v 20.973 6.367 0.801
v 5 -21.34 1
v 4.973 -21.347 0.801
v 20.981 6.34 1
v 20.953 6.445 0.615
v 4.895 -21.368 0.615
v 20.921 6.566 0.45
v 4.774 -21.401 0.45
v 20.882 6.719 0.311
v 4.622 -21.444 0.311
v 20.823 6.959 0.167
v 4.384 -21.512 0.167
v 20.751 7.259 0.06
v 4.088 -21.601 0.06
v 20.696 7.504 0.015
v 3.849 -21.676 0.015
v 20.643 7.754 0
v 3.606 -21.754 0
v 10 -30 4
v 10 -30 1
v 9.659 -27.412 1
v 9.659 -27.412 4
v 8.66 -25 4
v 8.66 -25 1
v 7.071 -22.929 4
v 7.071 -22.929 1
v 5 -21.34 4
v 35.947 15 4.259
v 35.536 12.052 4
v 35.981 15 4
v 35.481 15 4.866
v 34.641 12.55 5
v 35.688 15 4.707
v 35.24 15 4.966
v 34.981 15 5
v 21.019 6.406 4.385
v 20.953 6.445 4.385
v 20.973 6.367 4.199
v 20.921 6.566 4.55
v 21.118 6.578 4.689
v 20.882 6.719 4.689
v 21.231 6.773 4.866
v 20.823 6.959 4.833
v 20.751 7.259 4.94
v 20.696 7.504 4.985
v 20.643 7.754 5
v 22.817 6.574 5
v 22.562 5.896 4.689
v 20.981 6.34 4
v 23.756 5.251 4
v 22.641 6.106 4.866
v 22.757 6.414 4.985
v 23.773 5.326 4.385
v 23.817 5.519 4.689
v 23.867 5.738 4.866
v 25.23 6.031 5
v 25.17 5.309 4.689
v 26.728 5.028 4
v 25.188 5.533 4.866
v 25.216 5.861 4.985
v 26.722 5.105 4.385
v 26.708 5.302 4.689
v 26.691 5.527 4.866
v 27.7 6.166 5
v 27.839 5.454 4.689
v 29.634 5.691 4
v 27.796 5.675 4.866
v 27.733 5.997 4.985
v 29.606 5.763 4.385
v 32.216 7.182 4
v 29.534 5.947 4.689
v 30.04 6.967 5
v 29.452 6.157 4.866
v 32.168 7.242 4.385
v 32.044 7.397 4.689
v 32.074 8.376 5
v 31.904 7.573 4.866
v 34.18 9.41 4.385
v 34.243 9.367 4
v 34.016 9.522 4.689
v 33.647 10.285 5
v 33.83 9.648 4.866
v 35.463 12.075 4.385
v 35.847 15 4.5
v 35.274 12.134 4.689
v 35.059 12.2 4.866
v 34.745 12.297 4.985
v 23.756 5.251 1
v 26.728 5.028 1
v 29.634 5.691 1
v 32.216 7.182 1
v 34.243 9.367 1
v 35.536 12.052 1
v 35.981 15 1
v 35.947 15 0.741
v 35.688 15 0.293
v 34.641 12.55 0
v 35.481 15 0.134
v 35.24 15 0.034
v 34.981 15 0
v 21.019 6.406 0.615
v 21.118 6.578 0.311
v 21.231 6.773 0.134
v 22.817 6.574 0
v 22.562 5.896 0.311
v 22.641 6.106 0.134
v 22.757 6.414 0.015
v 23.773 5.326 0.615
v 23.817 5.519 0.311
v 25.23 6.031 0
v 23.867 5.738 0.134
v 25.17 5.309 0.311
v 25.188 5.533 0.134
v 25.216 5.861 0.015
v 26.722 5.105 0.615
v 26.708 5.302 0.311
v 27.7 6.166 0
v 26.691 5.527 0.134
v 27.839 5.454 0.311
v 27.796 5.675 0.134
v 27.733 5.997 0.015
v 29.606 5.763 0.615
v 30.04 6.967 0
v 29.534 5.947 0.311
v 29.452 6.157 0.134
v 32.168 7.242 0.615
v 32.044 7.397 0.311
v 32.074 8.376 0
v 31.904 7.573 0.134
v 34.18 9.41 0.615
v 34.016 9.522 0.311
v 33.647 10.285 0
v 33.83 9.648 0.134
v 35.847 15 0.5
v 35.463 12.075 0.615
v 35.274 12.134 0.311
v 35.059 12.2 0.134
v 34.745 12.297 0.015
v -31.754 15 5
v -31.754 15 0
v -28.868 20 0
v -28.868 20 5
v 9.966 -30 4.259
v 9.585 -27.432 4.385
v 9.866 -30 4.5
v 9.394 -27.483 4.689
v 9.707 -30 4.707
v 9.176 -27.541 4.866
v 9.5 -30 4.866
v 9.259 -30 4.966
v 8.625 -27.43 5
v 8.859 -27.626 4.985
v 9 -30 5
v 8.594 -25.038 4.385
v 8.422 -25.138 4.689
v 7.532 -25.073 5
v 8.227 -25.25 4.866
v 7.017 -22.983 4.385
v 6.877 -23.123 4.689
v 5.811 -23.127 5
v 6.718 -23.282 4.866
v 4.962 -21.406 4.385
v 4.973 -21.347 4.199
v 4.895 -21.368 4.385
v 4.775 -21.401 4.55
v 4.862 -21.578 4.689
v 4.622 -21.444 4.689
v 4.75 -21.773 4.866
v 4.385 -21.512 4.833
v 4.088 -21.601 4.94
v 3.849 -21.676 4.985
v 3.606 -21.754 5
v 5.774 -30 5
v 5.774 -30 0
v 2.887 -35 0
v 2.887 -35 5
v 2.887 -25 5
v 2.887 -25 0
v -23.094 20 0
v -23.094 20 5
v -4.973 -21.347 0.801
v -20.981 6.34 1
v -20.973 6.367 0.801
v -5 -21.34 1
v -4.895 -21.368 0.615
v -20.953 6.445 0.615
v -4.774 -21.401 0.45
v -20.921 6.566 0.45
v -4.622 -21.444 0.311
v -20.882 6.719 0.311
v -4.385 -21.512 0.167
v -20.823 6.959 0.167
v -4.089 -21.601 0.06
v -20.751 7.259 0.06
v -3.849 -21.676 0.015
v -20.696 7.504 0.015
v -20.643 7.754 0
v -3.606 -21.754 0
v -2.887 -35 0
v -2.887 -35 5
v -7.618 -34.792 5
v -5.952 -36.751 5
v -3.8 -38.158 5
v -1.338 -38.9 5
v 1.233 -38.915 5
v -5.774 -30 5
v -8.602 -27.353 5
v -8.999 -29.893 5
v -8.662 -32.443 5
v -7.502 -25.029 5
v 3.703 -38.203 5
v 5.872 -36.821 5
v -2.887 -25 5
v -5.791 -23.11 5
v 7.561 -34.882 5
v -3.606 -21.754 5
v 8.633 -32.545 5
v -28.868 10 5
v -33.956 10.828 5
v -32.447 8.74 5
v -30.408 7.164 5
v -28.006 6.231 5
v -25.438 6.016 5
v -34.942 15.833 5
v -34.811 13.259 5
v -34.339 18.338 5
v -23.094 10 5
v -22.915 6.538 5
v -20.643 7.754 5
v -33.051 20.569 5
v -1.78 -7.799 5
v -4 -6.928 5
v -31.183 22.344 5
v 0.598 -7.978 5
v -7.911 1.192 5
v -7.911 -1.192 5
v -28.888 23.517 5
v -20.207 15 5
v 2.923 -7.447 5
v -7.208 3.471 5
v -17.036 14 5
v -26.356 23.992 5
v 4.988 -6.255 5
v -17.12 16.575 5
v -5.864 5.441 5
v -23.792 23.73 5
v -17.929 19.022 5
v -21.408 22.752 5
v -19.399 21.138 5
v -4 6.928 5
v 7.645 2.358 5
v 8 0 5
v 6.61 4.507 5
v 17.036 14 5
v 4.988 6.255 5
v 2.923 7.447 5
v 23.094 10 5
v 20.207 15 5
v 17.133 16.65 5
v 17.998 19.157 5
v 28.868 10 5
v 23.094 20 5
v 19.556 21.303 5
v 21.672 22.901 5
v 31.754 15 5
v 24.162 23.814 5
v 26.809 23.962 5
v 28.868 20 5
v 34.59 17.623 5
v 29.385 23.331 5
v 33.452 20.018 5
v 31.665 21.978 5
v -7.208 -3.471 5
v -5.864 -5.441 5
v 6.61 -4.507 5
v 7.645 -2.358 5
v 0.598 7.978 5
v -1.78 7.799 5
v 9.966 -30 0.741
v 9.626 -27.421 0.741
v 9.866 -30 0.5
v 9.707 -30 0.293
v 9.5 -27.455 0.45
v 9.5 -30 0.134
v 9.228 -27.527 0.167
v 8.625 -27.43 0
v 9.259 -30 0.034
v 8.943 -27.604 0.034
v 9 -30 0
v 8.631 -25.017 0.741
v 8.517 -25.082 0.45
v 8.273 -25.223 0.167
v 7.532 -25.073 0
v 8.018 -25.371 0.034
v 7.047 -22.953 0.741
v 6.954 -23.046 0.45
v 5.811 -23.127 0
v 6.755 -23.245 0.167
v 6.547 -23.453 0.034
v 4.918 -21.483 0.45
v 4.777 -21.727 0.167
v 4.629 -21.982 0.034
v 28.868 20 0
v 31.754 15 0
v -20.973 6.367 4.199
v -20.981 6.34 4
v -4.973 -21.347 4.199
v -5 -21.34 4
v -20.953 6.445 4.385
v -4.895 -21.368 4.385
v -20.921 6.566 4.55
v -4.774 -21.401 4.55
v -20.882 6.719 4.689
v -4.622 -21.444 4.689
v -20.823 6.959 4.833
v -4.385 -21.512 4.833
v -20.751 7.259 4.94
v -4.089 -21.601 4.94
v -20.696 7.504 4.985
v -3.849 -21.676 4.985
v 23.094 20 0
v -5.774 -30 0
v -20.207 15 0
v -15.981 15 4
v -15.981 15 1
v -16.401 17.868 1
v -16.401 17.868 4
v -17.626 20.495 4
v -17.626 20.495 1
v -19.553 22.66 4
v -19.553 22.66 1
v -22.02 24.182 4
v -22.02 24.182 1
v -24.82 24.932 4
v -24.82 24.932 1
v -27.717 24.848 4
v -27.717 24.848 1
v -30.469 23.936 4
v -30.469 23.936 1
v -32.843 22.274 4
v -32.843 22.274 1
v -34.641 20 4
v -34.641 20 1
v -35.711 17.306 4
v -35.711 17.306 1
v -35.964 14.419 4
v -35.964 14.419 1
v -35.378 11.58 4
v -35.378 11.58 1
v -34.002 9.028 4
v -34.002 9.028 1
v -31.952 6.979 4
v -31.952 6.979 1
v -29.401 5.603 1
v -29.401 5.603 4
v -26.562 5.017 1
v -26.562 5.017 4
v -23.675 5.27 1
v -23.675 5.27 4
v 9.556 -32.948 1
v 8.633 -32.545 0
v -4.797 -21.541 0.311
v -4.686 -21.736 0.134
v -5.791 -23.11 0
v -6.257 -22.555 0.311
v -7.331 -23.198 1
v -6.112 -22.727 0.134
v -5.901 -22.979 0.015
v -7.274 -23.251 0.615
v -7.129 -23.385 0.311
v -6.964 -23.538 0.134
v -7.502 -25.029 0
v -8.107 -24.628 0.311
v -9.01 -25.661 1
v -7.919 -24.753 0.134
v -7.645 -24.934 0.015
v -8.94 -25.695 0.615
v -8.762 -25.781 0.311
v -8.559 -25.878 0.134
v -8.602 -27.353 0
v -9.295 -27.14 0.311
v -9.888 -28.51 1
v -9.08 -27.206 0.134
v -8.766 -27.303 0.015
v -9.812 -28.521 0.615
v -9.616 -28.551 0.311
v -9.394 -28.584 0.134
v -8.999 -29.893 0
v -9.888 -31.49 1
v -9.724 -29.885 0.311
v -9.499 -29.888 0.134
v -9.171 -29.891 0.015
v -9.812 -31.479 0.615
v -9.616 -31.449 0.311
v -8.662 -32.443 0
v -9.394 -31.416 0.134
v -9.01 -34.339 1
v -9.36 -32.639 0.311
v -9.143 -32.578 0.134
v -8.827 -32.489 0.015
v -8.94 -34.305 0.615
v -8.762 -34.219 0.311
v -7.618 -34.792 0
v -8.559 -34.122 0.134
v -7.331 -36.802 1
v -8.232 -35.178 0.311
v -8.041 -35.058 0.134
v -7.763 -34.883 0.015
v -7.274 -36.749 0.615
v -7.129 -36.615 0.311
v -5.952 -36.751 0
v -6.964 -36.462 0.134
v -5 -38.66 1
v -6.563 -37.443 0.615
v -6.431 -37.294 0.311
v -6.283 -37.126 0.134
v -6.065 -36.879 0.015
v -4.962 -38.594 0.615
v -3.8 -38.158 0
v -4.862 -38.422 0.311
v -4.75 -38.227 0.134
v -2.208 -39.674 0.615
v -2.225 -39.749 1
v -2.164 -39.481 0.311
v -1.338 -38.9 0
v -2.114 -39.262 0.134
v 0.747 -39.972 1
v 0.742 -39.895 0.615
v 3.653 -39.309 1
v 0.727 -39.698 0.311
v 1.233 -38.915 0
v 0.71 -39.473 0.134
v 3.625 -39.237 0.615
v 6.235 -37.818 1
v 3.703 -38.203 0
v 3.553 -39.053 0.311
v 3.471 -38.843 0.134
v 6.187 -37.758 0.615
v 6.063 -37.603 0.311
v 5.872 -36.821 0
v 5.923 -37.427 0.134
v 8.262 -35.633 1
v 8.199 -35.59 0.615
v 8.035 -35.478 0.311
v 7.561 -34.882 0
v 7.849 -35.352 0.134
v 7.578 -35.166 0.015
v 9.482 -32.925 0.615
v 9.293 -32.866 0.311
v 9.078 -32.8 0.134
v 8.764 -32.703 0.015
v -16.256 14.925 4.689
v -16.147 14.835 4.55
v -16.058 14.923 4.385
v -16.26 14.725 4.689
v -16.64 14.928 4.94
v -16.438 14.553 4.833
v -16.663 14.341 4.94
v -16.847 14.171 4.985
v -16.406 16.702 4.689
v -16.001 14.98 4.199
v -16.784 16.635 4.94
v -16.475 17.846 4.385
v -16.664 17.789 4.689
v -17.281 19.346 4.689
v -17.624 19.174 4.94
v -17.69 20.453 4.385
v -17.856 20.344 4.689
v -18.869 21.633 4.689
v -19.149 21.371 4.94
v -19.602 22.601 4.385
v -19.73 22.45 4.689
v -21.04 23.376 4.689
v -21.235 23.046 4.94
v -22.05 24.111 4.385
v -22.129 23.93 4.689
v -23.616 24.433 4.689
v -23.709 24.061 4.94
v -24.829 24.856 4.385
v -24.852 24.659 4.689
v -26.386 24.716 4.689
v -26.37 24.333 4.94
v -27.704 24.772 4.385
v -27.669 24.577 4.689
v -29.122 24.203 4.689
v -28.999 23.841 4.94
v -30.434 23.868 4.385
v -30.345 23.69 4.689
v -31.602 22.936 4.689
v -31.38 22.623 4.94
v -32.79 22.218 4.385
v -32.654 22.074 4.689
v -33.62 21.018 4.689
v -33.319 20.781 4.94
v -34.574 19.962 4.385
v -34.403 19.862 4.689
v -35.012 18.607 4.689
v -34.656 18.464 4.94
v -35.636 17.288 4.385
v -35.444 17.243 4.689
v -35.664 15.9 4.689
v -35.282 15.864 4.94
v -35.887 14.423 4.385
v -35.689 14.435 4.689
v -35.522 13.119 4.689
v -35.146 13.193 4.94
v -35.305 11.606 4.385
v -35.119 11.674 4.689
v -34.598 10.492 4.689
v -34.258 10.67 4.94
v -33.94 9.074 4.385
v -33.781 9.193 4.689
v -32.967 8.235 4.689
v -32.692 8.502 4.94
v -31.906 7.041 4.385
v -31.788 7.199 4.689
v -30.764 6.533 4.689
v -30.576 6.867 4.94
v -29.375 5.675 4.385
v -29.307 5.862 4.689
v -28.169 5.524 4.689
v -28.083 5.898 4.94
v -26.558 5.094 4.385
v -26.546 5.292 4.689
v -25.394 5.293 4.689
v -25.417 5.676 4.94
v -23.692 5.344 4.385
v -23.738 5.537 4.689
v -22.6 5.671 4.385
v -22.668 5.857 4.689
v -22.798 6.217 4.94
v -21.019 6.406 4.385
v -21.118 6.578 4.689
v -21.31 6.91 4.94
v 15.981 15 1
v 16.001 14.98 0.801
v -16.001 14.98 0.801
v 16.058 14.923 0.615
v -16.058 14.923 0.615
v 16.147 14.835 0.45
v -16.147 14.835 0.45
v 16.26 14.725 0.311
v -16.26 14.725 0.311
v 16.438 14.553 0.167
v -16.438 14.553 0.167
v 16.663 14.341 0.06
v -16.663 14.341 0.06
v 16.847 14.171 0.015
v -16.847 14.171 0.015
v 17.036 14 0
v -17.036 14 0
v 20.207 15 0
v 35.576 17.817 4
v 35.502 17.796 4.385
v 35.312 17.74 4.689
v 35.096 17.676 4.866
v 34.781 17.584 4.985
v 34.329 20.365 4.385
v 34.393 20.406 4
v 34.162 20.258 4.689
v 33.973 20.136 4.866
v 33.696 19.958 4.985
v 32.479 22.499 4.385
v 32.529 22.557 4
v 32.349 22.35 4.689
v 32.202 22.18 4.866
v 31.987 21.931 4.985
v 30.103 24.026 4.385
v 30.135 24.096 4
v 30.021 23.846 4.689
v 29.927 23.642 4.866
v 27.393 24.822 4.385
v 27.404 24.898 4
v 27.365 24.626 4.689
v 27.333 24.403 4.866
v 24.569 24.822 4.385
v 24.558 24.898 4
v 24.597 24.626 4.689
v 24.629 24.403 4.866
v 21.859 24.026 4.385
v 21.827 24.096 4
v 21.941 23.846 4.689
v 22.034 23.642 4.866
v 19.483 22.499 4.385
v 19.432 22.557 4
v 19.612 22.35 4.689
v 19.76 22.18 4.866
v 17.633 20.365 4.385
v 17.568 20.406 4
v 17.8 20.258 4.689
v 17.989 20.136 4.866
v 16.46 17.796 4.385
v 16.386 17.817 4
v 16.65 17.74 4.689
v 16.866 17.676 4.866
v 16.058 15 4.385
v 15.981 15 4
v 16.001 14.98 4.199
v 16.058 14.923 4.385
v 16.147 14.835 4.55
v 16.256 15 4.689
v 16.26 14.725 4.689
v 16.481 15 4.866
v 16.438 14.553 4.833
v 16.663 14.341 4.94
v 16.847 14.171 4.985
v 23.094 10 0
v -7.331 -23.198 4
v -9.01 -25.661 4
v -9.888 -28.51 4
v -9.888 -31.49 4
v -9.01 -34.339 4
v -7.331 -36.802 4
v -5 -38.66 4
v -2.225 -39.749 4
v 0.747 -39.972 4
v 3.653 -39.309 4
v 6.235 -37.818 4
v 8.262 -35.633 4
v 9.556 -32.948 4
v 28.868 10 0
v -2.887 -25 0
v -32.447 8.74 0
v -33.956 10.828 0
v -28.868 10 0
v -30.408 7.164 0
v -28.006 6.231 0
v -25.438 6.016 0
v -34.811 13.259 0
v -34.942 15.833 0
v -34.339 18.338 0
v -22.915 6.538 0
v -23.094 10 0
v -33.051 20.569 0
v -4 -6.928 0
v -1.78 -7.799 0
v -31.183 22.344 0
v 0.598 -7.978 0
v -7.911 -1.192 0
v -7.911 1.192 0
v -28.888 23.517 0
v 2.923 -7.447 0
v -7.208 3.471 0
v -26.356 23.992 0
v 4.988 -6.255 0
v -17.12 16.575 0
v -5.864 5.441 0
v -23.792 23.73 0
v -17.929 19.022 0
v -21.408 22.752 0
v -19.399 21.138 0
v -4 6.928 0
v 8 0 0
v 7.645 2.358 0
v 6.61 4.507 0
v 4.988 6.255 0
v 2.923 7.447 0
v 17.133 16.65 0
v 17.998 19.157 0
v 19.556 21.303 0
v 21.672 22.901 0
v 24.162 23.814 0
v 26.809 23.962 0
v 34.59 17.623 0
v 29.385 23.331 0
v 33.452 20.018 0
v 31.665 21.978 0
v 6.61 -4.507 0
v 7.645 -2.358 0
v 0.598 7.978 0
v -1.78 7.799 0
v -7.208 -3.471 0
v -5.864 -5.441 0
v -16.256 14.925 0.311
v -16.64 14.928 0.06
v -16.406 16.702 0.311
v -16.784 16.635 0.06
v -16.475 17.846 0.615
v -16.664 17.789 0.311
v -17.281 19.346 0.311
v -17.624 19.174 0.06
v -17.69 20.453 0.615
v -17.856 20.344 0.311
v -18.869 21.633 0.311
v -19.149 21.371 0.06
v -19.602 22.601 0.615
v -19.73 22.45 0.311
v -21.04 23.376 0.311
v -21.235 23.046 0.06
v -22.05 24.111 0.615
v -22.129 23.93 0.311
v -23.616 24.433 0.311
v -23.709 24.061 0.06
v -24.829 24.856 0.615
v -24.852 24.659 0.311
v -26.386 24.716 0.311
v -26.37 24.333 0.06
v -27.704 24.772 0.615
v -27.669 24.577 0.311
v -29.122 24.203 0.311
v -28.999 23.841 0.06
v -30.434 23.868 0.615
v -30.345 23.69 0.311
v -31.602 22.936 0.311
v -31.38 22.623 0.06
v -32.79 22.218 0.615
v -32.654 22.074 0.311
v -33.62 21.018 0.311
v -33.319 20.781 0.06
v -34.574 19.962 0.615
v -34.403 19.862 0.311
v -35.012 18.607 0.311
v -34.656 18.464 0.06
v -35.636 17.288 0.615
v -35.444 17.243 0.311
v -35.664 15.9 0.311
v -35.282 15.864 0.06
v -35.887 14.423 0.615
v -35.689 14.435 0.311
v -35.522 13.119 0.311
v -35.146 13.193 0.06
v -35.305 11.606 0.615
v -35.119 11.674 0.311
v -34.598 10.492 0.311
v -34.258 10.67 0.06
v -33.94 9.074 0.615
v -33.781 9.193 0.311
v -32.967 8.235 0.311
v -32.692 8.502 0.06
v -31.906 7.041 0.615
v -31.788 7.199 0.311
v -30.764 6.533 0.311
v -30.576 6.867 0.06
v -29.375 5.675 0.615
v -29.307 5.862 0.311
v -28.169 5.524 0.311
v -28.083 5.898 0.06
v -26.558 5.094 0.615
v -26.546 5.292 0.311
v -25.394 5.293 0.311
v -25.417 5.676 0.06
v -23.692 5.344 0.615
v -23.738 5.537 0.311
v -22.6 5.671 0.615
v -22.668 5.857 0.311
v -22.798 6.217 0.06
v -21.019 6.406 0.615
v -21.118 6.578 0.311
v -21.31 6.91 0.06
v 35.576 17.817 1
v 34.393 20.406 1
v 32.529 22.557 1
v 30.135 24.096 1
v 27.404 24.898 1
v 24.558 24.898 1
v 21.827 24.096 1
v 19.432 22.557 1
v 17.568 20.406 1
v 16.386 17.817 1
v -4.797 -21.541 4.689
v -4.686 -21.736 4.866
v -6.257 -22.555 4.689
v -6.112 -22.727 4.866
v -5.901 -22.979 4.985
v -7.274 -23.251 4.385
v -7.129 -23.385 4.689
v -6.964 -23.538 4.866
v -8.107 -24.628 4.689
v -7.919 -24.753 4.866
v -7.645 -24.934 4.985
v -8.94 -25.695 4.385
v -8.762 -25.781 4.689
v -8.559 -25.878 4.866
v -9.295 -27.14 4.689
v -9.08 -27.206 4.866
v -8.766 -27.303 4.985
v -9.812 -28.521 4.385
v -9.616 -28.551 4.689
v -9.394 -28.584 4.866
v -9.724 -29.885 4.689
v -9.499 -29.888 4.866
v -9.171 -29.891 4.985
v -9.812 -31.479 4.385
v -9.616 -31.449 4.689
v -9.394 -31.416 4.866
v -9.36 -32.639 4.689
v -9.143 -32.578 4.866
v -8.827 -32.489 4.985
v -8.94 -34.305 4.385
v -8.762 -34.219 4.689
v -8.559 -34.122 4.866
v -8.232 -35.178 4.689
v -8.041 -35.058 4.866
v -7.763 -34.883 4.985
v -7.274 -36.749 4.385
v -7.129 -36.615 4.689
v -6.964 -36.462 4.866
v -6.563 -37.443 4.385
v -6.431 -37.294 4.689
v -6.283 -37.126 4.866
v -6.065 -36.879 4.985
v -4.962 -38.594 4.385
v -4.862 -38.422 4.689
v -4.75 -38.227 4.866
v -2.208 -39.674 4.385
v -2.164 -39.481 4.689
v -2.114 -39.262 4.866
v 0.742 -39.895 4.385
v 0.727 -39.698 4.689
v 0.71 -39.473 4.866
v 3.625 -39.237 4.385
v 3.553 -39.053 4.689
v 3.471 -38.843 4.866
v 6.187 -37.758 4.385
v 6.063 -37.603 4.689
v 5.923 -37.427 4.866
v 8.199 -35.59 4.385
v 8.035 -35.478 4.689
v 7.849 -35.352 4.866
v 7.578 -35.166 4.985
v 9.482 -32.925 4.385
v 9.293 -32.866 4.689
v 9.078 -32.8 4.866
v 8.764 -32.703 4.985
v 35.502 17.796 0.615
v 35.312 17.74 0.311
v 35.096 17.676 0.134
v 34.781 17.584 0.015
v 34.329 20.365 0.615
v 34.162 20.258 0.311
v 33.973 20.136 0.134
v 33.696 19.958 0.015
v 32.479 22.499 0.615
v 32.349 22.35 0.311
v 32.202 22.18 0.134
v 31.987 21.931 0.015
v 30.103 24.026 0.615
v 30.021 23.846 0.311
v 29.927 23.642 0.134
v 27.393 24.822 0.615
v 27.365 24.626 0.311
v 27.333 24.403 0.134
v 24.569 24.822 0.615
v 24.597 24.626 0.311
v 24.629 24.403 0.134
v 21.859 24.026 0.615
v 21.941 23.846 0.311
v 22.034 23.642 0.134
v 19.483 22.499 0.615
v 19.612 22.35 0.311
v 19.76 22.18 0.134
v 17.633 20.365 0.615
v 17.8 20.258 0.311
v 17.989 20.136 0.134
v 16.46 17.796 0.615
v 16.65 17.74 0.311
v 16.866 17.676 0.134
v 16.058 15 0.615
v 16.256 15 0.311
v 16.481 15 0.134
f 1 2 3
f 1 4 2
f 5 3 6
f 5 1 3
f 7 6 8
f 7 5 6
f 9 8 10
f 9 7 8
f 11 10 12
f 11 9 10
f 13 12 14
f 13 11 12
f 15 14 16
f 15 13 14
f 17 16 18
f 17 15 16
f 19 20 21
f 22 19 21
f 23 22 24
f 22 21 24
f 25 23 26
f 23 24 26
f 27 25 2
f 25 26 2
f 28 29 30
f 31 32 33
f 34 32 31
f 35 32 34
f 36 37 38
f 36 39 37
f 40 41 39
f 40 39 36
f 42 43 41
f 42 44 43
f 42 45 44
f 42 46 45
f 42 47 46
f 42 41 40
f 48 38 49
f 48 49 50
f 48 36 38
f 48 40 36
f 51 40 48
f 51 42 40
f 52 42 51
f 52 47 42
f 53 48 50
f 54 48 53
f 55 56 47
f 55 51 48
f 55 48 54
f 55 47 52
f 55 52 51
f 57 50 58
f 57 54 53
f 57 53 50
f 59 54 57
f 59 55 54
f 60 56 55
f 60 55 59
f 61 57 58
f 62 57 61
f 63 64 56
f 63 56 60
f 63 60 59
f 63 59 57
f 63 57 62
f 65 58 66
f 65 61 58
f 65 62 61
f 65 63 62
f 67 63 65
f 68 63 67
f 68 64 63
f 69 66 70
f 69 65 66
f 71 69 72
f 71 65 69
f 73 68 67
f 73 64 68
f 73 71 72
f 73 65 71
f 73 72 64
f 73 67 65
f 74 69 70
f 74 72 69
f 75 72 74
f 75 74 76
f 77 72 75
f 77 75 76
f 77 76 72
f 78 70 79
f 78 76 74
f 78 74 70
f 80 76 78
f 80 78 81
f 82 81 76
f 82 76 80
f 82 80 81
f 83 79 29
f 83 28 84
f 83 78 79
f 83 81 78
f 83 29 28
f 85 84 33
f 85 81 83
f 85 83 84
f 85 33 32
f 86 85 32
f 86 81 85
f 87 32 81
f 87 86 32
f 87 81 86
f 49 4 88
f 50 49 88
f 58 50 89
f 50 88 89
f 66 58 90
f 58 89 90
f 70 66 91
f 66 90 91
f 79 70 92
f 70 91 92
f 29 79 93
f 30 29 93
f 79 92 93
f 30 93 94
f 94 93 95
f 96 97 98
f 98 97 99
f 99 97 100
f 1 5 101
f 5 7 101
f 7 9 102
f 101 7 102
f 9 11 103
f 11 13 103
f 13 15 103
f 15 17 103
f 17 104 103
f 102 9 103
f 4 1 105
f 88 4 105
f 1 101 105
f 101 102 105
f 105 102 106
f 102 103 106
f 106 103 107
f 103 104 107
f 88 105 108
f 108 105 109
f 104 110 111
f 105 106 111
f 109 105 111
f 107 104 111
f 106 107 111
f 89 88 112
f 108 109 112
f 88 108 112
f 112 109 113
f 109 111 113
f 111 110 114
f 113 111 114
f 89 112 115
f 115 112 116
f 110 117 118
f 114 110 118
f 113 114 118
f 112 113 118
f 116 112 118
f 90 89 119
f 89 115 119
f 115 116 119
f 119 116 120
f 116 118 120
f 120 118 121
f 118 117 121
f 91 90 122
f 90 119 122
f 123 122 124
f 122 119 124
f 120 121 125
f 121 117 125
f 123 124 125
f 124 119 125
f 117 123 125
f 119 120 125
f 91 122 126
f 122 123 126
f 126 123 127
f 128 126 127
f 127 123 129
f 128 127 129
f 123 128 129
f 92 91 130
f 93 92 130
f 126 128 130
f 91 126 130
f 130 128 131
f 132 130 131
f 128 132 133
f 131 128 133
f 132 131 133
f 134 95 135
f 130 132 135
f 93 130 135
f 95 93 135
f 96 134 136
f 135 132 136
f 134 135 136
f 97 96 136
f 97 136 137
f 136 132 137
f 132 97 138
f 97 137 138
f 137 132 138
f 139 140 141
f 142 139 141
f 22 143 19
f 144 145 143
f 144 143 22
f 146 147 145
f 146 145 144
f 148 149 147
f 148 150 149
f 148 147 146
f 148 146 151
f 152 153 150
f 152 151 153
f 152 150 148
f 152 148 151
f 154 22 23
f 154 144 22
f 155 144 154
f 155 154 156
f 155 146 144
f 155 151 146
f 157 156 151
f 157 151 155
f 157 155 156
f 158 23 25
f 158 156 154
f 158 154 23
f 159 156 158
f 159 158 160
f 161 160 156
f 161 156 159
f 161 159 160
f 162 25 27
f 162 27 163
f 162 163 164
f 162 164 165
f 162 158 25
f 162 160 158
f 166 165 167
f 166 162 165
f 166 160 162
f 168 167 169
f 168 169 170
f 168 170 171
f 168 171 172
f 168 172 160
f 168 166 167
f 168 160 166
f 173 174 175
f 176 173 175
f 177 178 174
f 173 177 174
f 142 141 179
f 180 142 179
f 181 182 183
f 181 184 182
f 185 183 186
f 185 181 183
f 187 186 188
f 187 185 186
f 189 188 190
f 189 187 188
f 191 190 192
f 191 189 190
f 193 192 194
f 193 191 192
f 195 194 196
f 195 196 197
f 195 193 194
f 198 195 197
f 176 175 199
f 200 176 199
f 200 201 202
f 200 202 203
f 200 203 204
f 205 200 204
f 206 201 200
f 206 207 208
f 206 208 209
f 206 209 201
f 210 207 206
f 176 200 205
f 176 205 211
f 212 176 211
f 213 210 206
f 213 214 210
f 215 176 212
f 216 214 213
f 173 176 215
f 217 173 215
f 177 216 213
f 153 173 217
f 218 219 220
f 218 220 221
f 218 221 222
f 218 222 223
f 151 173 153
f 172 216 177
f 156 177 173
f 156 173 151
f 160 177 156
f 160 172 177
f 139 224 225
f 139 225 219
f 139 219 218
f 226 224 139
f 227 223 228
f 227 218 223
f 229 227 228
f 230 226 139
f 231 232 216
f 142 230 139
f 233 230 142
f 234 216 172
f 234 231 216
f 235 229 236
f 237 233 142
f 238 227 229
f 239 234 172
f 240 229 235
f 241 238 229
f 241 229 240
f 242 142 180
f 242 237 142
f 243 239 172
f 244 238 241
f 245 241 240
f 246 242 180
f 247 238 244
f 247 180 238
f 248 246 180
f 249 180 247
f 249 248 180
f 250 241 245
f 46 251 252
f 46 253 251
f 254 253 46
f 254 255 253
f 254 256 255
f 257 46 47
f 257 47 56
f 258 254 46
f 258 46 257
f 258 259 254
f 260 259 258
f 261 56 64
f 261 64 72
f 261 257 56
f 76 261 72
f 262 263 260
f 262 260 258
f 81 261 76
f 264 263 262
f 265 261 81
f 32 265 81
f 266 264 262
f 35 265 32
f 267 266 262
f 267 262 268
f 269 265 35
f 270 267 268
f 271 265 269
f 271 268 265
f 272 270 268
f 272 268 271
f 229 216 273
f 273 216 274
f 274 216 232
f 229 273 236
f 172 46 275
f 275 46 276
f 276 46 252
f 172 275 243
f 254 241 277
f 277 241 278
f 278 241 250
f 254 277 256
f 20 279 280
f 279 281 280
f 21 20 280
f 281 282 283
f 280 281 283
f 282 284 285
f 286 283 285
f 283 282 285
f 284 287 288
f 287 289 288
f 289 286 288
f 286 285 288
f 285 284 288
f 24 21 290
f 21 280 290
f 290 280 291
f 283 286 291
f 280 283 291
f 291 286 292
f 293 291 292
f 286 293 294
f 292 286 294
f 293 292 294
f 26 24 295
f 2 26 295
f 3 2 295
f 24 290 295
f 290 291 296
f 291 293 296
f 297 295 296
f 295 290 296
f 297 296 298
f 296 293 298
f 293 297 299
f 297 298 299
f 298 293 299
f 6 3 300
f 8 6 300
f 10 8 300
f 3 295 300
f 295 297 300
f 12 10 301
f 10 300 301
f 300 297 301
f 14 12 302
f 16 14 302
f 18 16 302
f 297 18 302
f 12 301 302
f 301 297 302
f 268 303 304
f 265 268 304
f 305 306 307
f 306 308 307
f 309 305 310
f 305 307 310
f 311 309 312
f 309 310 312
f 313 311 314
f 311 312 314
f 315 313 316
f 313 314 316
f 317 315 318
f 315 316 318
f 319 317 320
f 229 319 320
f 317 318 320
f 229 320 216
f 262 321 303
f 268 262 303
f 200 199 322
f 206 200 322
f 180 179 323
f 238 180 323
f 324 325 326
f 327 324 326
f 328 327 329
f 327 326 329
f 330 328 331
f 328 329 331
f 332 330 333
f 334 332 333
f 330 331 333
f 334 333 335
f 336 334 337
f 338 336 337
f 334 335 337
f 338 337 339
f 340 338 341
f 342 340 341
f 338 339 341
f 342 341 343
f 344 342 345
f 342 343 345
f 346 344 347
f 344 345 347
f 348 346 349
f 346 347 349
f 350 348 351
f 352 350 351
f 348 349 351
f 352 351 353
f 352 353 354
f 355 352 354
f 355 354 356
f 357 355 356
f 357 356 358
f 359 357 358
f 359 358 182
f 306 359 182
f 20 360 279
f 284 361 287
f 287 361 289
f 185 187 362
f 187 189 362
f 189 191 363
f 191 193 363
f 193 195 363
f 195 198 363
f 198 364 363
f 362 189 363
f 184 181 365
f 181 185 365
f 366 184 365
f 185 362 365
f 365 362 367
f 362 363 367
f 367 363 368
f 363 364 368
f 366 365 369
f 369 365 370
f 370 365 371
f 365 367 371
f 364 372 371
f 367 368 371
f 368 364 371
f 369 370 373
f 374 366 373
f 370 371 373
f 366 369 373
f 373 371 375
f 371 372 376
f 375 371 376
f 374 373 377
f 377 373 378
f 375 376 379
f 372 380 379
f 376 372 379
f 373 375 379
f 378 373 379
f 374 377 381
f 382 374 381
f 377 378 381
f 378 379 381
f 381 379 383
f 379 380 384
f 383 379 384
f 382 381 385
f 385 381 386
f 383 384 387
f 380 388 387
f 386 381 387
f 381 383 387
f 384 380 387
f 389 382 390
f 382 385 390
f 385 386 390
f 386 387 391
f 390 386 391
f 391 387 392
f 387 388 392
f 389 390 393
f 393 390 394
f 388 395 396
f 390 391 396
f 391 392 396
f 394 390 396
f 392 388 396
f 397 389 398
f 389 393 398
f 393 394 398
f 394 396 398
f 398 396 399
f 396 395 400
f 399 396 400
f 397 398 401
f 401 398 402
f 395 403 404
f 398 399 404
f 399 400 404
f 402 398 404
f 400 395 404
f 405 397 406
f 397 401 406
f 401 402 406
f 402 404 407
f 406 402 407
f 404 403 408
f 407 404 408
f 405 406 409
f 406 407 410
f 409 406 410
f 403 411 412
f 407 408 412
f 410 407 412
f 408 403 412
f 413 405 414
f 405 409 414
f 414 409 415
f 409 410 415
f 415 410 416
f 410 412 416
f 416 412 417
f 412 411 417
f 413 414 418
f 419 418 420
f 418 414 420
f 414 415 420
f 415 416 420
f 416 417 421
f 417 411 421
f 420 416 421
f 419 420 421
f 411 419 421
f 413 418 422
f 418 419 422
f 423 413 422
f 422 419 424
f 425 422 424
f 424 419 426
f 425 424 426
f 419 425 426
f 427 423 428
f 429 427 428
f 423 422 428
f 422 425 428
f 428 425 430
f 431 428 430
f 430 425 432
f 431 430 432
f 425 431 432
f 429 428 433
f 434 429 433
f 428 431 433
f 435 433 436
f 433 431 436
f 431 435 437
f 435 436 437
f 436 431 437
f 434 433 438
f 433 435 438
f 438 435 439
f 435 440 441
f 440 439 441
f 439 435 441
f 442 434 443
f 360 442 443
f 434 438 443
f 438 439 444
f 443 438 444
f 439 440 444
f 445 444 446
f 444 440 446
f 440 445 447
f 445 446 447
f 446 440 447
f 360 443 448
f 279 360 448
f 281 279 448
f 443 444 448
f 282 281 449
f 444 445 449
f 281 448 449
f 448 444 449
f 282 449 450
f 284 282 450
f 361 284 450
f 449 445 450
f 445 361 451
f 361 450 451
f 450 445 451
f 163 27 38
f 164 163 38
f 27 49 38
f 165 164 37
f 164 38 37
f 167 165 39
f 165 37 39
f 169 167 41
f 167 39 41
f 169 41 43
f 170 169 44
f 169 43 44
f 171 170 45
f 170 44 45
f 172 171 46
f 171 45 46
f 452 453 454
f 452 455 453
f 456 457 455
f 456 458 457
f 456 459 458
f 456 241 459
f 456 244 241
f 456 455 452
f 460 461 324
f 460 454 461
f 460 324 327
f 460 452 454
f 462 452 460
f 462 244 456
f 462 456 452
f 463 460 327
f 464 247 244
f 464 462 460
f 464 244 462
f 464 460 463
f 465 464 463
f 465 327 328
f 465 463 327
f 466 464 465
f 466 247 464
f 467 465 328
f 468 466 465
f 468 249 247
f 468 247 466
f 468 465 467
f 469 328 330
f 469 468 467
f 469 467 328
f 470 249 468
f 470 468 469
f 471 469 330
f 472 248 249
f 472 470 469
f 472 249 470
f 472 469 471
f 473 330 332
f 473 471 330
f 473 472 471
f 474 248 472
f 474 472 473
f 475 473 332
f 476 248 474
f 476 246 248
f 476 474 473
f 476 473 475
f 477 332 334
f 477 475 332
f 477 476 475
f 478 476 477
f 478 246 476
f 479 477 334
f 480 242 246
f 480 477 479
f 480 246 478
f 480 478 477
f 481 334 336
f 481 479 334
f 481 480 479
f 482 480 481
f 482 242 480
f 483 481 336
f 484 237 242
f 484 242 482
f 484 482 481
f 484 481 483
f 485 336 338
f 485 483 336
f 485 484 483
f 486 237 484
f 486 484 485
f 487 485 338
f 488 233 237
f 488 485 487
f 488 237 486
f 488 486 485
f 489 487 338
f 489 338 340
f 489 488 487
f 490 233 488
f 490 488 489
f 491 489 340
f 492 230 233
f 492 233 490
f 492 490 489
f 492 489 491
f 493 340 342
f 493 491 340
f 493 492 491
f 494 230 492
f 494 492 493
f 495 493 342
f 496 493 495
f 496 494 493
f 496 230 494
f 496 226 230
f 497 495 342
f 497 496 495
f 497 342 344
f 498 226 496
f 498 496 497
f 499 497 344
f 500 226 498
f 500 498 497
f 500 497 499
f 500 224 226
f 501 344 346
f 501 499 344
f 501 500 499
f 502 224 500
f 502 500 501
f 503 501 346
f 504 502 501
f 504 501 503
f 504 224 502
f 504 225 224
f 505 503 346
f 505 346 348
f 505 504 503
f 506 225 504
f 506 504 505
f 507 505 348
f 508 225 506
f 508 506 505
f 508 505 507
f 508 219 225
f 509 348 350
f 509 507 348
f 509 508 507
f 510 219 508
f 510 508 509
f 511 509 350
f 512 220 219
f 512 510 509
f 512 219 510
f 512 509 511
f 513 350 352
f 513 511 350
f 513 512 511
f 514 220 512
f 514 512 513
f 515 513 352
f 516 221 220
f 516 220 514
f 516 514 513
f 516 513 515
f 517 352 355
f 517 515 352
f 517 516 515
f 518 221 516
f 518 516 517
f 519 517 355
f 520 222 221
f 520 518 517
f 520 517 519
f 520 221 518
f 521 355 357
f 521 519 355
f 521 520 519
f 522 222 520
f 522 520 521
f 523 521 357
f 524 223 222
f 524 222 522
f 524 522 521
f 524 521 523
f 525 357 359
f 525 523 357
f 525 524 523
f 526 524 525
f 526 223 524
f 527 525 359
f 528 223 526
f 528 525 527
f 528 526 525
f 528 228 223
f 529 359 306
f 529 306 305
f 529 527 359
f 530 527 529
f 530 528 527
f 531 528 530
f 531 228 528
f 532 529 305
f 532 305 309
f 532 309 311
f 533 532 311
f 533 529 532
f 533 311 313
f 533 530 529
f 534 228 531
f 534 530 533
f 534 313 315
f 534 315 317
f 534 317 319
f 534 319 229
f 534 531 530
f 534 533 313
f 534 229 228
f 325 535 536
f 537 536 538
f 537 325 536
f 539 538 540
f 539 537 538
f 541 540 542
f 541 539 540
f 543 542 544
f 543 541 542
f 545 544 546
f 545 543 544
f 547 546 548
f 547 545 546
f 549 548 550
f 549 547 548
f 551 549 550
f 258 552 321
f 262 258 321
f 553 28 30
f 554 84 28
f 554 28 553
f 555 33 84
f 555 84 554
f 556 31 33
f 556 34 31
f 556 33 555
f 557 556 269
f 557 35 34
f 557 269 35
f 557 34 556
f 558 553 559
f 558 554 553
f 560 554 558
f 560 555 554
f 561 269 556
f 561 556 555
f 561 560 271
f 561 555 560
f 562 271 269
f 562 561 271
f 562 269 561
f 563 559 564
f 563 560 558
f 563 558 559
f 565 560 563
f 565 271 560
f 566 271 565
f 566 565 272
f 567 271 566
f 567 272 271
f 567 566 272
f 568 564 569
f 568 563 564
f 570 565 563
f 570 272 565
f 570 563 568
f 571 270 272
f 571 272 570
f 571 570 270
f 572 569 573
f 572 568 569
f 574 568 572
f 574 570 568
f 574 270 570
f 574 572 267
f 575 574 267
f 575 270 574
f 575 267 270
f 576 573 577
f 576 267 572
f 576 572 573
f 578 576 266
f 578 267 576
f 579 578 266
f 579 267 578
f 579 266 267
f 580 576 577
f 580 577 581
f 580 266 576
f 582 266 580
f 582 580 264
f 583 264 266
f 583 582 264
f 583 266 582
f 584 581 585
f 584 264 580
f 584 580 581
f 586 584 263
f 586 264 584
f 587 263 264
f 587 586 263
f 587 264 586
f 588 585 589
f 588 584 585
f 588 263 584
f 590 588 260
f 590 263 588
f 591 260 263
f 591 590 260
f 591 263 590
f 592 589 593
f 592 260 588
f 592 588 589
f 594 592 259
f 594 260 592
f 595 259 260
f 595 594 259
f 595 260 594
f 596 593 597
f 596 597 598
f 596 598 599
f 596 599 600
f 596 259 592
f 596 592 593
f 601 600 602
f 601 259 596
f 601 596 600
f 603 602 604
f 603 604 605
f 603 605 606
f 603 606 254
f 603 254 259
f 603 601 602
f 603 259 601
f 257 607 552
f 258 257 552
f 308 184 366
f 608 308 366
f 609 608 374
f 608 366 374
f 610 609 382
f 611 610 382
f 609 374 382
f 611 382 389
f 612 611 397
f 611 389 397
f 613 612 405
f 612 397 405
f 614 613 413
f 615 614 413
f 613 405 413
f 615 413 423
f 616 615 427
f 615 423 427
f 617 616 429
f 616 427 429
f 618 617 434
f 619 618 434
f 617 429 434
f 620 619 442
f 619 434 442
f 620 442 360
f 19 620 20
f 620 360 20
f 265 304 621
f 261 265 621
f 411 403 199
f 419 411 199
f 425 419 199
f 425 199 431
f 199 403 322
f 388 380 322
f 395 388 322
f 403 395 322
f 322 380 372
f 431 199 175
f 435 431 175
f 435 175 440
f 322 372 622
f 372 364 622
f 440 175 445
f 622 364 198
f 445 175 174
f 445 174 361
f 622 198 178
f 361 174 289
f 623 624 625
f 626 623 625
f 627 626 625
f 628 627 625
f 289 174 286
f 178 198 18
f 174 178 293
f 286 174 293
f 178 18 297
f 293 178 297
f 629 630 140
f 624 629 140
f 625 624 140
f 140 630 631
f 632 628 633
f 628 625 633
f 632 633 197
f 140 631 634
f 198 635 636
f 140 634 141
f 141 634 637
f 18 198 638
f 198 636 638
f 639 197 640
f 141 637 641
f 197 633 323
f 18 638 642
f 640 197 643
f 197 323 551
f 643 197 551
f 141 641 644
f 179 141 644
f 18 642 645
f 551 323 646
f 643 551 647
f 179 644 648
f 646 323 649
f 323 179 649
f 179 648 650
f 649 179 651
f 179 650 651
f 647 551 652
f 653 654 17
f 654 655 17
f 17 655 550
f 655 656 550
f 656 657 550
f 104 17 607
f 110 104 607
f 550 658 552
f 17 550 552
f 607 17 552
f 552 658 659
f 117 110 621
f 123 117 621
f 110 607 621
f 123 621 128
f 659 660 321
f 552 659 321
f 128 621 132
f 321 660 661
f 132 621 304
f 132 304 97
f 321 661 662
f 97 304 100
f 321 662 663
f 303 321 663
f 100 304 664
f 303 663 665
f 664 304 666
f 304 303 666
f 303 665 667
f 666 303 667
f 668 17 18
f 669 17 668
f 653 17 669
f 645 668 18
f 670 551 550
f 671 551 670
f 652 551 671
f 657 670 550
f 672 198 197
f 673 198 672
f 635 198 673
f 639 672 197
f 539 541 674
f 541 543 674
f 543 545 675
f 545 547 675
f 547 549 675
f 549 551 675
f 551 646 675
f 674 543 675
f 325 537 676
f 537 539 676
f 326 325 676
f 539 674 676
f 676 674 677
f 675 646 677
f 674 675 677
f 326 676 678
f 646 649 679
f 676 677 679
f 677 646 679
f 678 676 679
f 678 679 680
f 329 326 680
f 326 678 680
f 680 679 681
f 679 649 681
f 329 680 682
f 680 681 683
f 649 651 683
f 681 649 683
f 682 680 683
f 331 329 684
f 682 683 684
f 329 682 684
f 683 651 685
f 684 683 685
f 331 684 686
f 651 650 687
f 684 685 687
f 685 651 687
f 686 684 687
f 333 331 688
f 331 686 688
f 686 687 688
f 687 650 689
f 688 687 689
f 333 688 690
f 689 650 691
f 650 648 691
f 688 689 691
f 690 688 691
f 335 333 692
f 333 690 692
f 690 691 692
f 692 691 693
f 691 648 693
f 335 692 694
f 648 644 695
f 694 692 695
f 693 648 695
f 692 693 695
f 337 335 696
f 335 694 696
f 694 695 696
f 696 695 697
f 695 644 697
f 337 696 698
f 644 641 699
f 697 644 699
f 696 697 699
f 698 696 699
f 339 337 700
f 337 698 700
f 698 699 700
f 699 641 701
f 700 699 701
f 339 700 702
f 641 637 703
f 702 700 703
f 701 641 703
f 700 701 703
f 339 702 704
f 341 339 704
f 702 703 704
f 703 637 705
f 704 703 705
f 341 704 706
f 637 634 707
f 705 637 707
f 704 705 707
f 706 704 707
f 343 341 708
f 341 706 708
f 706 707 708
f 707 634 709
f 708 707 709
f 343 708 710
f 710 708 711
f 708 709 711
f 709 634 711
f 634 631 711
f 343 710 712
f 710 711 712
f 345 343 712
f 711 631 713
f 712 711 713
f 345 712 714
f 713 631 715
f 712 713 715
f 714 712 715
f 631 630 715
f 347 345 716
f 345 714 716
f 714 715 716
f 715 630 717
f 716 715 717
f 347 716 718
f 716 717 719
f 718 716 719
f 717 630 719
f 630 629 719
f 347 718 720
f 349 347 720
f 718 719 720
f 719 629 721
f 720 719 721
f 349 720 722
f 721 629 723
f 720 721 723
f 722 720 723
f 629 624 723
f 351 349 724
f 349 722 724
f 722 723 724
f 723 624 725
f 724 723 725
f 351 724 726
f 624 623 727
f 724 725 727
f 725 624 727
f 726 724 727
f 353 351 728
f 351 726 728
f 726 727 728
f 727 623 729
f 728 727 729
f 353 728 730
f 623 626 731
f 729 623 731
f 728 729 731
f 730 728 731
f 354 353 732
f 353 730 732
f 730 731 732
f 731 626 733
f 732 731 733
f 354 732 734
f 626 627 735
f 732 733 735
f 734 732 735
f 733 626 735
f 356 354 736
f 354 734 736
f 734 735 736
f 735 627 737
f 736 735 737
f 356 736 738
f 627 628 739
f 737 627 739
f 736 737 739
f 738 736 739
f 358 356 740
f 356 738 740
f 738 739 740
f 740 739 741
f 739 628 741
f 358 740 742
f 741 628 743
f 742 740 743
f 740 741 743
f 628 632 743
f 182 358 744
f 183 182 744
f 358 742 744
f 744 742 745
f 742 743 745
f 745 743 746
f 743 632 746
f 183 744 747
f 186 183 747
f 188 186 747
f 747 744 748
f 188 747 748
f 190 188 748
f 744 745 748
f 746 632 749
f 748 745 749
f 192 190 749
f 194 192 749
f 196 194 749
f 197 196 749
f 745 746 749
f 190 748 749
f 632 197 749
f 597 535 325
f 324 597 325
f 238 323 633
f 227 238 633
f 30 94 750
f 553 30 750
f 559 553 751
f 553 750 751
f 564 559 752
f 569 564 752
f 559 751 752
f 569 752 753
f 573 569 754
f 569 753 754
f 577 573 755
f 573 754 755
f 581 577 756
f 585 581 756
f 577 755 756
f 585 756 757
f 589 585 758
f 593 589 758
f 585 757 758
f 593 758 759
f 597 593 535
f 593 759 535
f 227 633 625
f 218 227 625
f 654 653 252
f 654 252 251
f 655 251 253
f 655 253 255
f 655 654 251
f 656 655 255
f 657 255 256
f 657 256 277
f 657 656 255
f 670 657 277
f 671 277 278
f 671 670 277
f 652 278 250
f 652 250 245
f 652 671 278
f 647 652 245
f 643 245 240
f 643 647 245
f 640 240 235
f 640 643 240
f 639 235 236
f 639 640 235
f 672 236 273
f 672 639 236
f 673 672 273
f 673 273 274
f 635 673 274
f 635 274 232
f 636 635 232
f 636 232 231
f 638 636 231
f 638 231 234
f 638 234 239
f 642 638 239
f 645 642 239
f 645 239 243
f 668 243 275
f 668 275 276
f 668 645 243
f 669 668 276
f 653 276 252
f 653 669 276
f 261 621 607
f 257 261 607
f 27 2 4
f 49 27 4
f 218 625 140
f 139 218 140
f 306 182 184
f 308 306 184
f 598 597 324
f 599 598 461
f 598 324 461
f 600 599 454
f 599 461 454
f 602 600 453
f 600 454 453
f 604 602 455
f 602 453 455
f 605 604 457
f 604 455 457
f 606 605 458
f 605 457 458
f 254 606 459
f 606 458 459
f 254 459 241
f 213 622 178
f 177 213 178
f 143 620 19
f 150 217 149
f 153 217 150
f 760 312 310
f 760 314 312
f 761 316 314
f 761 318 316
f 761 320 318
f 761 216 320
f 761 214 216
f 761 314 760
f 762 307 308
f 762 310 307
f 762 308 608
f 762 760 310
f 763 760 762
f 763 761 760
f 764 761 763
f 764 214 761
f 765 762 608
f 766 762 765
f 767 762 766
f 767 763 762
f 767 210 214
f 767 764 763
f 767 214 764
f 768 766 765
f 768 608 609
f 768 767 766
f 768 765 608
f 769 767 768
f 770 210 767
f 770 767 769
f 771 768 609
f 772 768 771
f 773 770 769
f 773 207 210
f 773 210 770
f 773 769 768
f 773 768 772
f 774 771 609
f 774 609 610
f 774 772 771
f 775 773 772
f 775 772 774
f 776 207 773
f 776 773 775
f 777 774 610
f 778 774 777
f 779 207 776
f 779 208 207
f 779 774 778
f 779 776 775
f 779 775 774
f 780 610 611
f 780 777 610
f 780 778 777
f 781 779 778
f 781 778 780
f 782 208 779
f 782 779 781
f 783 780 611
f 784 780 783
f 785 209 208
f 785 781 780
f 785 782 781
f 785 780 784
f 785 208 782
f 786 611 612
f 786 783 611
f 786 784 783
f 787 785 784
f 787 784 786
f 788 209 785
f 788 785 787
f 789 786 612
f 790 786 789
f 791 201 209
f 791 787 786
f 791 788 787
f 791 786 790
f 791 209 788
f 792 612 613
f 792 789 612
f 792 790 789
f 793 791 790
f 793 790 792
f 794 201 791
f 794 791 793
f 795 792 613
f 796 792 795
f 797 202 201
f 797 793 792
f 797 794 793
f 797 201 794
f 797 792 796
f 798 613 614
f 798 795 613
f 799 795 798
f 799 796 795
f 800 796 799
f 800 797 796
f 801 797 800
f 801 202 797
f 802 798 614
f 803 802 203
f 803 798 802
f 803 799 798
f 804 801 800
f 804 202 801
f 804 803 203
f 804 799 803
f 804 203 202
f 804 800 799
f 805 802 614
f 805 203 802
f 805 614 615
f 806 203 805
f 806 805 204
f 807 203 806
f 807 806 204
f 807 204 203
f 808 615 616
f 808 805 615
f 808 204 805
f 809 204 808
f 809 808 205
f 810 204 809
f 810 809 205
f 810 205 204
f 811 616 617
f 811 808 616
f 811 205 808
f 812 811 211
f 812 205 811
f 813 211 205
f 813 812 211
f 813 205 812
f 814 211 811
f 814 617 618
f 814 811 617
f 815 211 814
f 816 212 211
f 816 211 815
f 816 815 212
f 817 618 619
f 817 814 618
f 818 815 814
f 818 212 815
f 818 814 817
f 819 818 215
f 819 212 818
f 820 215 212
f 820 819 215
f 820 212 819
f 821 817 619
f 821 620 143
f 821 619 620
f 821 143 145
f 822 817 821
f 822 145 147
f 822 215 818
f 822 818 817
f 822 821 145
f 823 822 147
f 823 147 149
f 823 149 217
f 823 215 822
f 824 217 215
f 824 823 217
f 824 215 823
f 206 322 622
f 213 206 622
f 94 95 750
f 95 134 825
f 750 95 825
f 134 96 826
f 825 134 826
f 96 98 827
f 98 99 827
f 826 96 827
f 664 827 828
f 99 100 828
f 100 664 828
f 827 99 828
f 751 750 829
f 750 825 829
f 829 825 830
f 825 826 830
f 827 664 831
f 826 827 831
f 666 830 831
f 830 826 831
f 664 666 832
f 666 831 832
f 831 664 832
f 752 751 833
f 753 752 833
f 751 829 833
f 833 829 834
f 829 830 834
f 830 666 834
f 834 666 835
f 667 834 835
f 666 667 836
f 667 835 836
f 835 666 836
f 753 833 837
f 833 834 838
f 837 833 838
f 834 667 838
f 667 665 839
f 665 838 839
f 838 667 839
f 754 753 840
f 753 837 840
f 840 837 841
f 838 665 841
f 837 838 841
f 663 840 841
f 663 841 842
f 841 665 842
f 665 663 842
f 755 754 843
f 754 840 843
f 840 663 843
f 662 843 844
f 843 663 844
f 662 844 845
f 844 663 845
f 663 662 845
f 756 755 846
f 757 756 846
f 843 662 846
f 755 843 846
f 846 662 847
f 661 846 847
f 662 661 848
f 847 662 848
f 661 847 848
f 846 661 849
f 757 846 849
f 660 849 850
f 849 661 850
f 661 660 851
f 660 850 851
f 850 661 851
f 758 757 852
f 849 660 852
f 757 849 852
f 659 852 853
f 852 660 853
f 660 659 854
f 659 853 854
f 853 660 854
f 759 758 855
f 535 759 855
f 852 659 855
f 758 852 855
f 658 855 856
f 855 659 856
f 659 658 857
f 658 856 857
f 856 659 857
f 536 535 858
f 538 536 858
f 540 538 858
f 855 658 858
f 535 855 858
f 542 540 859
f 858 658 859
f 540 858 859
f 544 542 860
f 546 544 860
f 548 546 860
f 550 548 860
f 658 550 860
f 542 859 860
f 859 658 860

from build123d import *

# Parameters (mm, degrees)
F0_R     = 8
F1_DEPTH = 5
F2_R     = 1


with BuildPart() as f1:
    # F0 (on Top) → F1 (new body)
    with BuildSketch(Plane.XY):
        with BuildLine():
            ThreePointArc((10, -30), (8.660254, -25), (5, -21.339746))
            Line((5, -21.339746), (2.886751, -25))
            Line((2.886751, -25), (5.773503, -30))
            Line((5.773503, -30), (2.886751, -35))
            Line((2.886751, -35), (-2.886751, -35))
            Line((-2.886751, -35), (-5.773503, -30))
            Line((-5.773503, -30), (-2.886751, -25))
            Line((-2.886751, -25), (-5, -21.339746))
            ThreePointArc((-5, -21.339746), (-5, -38.660254), (10, -30))
        make_face()
        with BuildLine():
            ThreePointArc((20.980762, 6.339746), (17.320508, 10), (15.980762, 15))
            Line((15.980762, 15), (-15.980762, 15))
            ThreePointArc((-15.980762, 15), (-17.320508, 10), (-20.980762, 6.339746))
            Line((-20.980762, 6.339746), (-5, -21.339746))
            ThreePointArc((-5, -21.339746), (0, -20), (5, -21.339746))
            Line((5, -21.339746), (20.980762, 6.339746))
        make_face()
        Circle(F0_R, mode=Mode.SUBTRACT)
        with BuildLine():
            ThreePointArc((-20.980762, 6.339746), (-17.320508, 10), (-15.980762, 15))
            ThreePointArc((-15.980762, 15), (-34.641016, 20), (-20.980762, 6.339746))
        make_face()
        Polygon((-31.754265, 15), (-28.867513, 20), (-23.094011, 20), (-20.207259, 15), (-23.094011, 10), (-28.867513, 10), align=None, mode=Mode.SUBTRACT)
        with BuildLine():
            Line((20.207259, 15), (23.094011, 20))
            Line((23.094011, 20), (28.867513, 20))
            Line((28.867513, 20), (31.754265, 15))
            Line((31.754265, 15), (28.867513, 10))
            Line((28.867513, 10), (23.094011, 10))
            Line((23.094011, 10), (20.980762, 6.339746))
            ThreePointArc((20.980762, 6.339746), (30.980762, 6.339746), (35.980762, 15))
            ThreePointArc((35.980762, 15), (25.980762, 25), (15.980762, 15))
            Line((15.980762, 15), (20.207259, 15))
        make_face()
        with BuildLine():
            Line((2.886751, -25), (5, -21.339746))
            ThreePointArc((5, -21.339746), (0, -20), (-5, -21.339746))
            Line((-5, -21.339746), (-2.886751, -25))
            Line((-2.886751, -25), (2.886751, -25))
        make_face()
        with BuildLine():
            Line((23.094011, 10), (20.207259, 15))
            Line((20.207259, 15), (15.980762, 15))
            ThreePointArc((15.980762, 15), (17.320508, 10), (20.980762, 6.339746))
            Line((20.980762, 6.339746), (23.094011, 10))
        make_face()
    extrude(amount=F1_DEPTH)

    # F2
    f2_edges = [f1.edges().sort_by_distance(p)[0] for p in [
        (-34.641016, 20, 5),
        (0, 15, 5),
        (34.641016, 20, 5),
        (12.990381, -7.5, 5),
        (-5, -38.660254, 5),
        (-12.990381, -7.5, 5),
        (12.990381, -7.5, 0),
        (34.641016, 20, 0),
        (0, 15, 0),
        (-34.641016, 20, 0),
        (-5, -38.660254, 0),
        (-12.990381, -7.5, 0),
    ]]
    fillet(f2_edges, radius=F2_R)


solid = f1.part
